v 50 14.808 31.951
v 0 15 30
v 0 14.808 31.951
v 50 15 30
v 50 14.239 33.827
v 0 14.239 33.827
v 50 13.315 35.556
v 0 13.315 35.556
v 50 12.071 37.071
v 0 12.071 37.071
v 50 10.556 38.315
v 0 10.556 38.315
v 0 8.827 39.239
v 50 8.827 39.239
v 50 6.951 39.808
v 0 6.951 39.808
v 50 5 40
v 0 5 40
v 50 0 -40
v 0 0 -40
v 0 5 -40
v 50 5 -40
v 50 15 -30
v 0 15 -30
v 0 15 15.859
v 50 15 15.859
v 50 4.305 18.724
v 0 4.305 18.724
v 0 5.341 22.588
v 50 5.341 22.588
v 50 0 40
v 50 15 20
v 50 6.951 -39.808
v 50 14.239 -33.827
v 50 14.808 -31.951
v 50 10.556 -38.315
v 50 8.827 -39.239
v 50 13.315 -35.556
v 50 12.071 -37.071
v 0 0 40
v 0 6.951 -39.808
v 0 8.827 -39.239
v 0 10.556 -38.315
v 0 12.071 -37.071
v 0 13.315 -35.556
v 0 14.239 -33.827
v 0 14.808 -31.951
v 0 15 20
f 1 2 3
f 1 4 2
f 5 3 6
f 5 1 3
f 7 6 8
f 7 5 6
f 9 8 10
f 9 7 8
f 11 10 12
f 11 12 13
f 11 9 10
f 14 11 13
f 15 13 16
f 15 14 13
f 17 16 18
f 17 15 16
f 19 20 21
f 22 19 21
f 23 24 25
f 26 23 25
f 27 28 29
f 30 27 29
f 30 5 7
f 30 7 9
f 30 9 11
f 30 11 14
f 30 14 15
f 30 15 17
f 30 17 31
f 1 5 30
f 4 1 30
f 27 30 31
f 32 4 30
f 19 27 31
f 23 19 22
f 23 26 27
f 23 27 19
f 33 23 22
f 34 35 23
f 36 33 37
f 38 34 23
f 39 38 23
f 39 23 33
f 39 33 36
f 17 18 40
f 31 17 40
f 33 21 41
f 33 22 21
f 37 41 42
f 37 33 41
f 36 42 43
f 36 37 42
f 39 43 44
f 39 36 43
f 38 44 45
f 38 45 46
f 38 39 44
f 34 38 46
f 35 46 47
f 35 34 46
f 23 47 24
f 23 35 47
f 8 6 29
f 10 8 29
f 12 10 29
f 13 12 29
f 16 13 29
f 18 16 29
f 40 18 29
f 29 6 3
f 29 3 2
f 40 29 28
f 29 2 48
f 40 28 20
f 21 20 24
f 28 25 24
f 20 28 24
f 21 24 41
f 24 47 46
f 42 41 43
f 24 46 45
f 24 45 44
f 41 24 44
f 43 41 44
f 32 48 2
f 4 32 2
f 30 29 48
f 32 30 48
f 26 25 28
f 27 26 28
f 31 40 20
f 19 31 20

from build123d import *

# Parameters (mm, degrees)
BOSS_EXTRU_1_DEPTH = 50
CONG_1_R           = 10


with BuildPart() as part:
    # Esquisse1 → Boss.-Extru.1 (new body)
    with BuildSketch(Plane(origin=(0, 0, 0), x_dir=(0, 0, -1), z_dir=(1, 0, 0))):
        Polygon((-40, 0), (40, 0), (40, 15), (-15.858895278, 15), (-18.724487146, 4.305465557), (-22.588190451, 5.340741737), (-20, 15), (-40, 15), align=None)
    extrude(amount=BOSS_EXTRU_1_DEPTH)

    # Congé1
    cong_1_edges = [part.edges().sort_by_distance(p)[0] for p in [
        (25, 15, -40),
        (25, 15, 40),
    ]]
    fillet(cong_1_edges, radius=CONG_1_R)


solid = part.part
